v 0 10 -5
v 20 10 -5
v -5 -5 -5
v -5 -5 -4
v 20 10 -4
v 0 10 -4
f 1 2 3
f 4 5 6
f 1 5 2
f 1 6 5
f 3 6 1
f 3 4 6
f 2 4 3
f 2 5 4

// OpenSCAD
$fn=5;
translate([0,0,-5])
{
	linear_extrude(height=1,center=false,convexity=10,twist=0,slices=1)
	{
		polygon(points=[[-5,-5],[0,10],[20,10],],paths=undef,convexity=10);
	}
}
